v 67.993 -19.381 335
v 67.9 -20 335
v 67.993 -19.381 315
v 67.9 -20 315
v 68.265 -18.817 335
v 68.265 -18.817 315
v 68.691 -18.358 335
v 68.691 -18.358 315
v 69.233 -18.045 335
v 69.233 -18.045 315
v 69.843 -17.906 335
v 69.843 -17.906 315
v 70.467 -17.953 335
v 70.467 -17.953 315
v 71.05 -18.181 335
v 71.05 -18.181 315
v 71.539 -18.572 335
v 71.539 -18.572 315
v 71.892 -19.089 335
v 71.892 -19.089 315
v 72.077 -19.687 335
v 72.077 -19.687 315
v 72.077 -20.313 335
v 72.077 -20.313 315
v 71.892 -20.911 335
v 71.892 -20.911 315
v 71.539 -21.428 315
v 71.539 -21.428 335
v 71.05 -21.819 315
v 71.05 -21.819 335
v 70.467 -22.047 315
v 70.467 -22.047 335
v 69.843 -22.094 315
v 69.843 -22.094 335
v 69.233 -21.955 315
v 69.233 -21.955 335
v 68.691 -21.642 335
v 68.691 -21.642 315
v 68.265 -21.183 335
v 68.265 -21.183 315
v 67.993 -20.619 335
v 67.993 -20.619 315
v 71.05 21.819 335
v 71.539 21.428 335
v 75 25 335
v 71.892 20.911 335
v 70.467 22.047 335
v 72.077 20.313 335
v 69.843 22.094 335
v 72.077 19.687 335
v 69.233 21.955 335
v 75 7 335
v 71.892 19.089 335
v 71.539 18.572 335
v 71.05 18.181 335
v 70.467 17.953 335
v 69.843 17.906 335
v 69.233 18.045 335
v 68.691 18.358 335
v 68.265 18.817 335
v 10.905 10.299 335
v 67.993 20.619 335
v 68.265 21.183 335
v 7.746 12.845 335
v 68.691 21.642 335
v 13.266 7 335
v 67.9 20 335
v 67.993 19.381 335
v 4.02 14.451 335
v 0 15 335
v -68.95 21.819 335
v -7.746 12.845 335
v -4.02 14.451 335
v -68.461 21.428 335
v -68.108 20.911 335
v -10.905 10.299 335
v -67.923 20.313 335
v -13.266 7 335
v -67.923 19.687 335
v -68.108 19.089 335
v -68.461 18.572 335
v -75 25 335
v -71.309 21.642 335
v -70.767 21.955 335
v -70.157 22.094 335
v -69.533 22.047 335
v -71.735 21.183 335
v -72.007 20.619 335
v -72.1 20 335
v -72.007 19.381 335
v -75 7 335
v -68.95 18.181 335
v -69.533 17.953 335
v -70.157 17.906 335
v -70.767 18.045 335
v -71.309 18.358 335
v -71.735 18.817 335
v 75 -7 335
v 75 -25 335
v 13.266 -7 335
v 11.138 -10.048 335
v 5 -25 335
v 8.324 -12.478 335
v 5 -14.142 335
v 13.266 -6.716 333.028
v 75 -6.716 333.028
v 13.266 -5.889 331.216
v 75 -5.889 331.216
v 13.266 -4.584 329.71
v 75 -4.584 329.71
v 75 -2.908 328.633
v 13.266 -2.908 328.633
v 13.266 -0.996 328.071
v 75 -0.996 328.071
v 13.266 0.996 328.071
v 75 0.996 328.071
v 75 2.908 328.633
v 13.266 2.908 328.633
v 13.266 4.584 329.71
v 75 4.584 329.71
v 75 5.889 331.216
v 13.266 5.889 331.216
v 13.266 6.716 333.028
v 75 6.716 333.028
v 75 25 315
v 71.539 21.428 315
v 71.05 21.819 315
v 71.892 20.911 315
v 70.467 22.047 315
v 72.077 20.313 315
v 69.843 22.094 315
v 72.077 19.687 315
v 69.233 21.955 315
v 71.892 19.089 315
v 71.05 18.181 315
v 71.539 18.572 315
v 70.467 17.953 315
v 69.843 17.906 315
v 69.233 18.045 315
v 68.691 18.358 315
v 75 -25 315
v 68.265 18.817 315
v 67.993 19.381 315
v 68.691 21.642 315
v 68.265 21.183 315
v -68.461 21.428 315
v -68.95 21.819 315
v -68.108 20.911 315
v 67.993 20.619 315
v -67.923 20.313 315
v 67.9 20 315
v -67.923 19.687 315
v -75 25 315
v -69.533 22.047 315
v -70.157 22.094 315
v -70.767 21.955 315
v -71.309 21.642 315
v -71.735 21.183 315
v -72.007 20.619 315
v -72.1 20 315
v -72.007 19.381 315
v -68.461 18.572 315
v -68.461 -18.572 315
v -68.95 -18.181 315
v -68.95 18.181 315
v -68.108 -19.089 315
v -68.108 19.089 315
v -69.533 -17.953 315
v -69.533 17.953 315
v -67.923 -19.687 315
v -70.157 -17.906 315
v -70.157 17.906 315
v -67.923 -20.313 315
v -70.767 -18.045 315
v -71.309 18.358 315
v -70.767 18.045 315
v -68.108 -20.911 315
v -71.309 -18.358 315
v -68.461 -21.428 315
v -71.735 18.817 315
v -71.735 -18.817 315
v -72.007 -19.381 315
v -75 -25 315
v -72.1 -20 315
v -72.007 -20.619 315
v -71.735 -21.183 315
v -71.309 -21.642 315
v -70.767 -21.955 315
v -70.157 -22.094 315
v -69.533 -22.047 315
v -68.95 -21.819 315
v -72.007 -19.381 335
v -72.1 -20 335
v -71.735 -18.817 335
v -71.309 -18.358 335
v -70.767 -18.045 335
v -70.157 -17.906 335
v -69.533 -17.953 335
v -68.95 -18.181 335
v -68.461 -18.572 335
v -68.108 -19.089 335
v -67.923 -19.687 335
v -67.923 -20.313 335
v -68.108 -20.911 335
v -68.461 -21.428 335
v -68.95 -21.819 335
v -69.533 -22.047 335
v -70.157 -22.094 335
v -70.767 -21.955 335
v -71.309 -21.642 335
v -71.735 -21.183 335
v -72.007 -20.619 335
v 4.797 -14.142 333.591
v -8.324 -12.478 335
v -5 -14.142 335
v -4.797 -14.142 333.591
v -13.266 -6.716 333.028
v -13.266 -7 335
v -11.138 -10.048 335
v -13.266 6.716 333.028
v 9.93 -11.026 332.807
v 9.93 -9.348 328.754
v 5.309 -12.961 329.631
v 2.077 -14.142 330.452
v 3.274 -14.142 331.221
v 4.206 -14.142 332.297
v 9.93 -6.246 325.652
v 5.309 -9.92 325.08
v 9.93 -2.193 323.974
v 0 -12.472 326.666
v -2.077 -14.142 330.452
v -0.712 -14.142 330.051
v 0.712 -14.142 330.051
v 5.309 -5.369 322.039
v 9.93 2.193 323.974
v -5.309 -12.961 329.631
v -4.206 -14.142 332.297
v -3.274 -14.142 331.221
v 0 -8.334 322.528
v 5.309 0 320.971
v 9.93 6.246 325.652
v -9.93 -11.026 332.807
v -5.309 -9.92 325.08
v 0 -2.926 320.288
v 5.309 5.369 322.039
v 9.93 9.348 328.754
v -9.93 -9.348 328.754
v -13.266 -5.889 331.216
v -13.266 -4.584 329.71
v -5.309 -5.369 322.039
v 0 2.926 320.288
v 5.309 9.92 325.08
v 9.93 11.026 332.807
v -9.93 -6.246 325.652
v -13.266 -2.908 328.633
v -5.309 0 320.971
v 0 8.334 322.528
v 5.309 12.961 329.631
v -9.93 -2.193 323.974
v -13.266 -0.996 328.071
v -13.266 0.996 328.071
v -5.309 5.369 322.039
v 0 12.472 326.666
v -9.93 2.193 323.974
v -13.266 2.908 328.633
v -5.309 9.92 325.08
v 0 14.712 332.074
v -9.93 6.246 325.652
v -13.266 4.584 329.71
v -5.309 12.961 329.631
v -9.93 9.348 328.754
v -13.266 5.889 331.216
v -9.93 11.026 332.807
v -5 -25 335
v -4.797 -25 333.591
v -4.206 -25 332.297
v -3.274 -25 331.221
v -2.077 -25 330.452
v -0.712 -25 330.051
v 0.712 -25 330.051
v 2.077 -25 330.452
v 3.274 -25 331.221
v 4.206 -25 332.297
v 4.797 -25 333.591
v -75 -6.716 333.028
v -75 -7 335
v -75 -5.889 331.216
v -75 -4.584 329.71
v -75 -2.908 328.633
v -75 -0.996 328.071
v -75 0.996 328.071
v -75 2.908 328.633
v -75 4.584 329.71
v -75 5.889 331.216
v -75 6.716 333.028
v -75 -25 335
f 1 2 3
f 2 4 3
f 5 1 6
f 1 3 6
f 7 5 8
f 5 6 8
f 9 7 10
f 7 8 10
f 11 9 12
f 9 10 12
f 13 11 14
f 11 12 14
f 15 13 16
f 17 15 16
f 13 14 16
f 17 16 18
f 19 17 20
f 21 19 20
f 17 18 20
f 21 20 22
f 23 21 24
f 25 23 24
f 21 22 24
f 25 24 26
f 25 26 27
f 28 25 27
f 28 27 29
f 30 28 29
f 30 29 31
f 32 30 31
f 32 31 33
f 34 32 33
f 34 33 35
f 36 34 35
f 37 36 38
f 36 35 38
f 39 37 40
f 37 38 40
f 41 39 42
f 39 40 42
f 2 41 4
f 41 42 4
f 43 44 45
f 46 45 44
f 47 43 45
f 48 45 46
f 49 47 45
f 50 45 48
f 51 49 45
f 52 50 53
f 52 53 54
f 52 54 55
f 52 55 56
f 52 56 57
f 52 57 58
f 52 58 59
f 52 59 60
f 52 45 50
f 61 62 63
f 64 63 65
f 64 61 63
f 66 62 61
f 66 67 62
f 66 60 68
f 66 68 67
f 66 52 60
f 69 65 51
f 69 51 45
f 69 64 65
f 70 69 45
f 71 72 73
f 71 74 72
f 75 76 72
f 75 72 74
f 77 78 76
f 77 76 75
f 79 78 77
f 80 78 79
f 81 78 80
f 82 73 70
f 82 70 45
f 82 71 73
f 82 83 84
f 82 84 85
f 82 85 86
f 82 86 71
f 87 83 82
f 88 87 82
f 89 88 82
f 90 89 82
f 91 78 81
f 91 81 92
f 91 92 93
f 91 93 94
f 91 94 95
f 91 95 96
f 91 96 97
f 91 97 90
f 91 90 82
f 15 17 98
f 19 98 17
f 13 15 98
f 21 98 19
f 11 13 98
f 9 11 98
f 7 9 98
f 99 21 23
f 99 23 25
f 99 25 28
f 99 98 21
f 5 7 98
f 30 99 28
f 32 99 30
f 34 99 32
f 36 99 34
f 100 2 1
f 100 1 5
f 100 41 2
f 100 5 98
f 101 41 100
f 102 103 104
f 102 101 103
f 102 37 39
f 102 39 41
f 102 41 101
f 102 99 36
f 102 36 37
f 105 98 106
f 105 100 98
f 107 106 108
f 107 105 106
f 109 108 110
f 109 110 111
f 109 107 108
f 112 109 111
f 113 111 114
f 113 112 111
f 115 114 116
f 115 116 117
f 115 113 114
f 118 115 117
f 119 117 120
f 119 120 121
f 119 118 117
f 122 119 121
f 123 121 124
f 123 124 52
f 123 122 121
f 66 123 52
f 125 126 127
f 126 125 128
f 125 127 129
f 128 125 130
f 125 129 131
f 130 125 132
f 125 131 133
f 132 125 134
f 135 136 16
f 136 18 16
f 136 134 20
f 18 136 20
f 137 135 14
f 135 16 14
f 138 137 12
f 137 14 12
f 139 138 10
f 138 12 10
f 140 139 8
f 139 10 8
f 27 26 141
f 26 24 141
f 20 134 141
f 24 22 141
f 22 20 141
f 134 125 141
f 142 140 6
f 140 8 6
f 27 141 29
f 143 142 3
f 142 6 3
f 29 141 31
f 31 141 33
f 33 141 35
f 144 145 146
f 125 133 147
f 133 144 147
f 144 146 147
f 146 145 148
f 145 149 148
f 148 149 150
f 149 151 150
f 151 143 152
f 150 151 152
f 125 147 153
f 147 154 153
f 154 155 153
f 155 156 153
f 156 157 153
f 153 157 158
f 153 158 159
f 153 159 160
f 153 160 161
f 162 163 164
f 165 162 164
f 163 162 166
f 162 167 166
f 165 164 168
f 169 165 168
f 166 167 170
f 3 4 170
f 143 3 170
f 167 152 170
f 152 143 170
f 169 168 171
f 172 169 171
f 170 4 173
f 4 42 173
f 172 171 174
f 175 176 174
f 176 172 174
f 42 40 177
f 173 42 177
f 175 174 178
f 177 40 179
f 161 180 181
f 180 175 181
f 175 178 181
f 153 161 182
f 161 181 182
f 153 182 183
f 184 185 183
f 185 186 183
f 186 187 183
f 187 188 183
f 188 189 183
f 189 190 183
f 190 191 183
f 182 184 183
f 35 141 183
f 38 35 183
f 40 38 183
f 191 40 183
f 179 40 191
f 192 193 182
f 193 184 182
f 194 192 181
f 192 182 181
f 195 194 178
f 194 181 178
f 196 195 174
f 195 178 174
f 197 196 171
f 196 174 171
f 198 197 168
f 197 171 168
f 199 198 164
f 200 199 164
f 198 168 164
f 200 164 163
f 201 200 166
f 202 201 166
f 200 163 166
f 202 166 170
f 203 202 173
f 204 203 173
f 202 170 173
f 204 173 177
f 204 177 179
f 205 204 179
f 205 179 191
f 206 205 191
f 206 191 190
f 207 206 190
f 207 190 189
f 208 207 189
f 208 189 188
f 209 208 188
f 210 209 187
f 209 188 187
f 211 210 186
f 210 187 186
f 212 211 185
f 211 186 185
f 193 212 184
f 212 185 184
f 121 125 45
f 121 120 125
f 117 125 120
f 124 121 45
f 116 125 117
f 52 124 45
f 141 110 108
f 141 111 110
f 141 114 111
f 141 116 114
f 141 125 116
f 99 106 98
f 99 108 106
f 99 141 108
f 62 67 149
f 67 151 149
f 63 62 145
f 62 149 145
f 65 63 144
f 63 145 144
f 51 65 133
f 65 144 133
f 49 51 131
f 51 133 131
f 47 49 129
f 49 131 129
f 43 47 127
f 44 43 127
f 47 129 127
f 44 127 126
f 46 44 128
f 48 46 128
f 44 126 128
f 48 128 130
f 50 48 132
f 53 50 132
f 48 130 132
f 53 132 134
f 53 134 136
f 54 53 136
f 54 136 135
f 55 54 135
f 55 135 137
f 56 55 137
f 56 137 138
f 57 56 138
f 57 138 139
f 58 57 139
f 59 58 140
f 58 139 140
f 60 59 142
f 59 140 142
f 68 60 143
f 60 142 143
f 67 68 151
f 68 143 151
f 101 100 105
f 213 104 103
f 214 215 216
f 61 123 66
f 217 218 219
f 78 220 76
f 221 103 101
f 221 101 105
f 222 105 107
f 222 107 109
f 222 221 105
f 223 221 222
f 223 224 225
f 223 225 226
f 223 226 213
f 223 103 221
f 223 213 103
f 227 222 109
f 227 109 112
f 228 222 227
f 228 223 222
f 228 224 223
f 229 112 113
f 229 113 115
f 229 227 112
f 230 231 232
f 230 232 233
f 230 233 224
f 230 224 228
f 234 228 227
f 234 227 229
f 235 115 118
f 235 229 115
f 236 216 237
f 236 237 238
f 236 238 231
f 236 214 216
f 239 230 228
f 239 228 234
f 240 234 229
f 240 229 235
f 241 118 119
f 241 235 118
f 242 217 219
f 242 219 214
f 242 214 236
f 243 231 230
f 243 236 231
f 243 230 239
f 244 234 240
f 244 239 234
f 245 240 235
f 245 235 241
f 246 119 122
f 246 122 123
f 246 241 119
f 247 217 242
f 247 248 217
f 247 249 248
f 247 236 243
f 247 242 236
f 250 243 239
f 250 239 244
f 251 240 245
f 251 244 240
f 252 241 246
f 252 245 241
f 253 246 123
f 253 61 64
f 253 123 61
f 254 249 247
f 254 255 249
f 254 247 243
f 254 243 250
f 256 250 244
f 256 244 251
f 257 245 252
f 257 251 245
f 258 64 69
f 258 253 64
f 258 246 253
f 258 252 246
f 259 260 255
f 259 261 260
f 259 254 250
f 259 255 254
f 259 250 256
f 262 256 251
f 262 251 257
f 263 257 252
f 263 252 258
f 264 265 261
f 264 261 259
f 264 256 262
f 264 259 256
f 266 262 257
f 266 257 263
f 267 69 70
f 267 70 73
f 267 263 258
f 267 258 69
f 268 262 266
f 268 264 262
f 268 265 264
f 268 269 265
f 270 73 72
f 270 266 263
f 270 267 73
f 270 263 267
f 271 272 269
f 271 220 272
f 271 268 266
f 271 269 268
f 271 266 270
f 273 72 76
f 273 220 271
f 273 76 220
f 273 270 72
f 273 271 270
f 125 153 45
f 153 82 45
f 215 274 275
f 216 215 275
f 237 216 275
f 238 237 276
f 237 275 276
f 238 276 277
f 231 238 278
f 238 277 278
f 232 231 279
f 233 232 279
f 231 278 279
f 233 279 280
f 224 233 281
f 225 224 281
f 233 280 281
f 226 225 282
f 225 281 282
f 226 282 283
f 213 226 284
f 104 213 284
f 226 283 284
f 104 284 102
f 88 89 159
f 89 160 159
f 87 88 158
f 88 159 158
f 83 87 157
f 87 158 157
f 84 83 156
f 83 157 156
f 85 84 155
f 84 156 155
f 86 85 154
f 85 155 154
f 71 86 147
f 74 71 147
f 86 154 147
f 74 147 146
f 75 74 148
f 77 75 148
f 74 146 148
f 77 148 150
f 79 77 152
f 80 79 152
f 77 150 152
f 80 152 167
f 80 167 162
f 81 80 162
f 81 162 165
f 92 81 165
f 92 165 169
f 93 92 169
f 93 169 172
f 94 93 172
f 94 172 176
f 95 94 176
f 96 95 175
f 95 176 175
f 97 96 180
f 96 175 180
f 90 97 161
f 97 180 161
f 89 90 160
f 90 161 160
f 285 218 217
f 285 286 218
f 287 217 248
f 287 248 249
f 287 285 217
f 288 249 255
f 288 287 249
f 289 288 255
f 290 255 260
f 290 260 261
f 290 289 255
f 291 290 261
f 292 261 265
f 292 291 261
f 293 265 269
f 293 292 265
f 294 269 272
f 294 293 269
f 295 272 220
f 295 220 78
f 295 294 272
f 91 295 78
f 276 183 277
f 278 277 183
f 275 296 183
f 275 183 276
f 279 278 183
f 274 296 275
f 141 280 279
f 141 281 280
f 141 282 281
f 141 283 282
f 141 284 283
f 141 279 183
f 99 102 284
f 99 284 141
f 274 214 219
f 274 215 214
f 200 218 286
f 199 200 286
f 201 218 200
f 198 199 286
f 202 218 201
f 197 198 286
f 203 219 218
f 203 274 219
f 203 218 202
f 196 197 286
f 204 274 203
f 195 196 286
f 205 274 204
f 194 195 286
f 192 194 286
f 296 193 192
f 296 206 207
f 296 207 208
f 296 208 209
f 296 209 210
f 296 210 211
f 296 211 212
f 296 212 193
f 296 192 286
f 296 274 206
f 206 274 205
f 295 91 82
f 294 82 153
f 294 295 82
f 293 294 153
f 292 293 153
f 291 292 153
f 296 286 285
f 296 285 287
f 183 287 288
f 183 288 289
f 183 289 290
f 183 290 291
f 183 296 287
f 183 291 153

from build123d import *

# Parameters (mm, degrees)
F1_DEPTH  = 25
F5_D      = 4.2
F5_DEPTH  = 20
F5_TIP    = 1.2618073
F10_DEPTH = 50.001


with BuildPart() as f1:
    # F0 (on Front) → F1 (new body, symmetric)
    with BuildSketch(Plane.XZ):
        with BuildLine():
            ThreePointArc((0, 315), (37.7725508345, 312.7270925319), (75, 305.9411708156))
            Line((75, 305.9411708156), (75, 335))
            Line((75, 335), (0, 335))
            Line((0, 335), (0, 315))
        make_face()
        with BuildLine():
            ThreePointArc((-75, 305.9411708156), (-37.7725508345, 312.7270925319), (0, 315))
            Line((0, 315), (0, 335))
            Line((0, 335), (-75, 335))
            Line((-75, 335), (-75, 305.9411708156))
        make_face()
    extrude(amount=F1_DEPTH, both=True)

    # F2 (on face) → F3 (revolve, cut)
    with BuildSketch(Plane.XY.offset(335)):
        with BuildLine():
            Line((-13.2664991614, 7), (-75, 7))
            Line((-75, 7), (-75, 0))
            Line((-75, 0), (-15, 0))
            ThreePointArc((-15, 0), (-14.5601766373, 3.6057254872), (-13.2664991614, 7))
        make_face()
        with BuildLine():
            ThreePointArc((13.2664991614, 7), (0, 15), (-13.2664991614, 7))
            ThreePointArc((-13.2664991614, 7), (-14.5601766373, 3.6057254872), (-15, 0))
            Line((-15, 0), (-13.2664991614, 0))
            Line((-13.2664991614, 0), (13.2664991614, 0))
            Line((13.2664991614, 0), (15, 0))
            ThreePointArc((15, 0), (14.5601766373, 3.6057254872), (13.2664991614, 7))
        make_face()
        with BuildLine():
            Line((75, 7), (13.2664991614, 7))
            ThreePointArc((13.2664991614, 7), (14.5601766373, 3.6057254872), (15, 0))
            Line((15, 0), (75, 0))
            Line((75, 0), (75, 7))
        make_face()
    revolve(axis=Axis((-44.1332495807, 0, 335), (1, 0, 0)), mode=Mode.SUBTRACT)

    # F5
    with Locations(Plane.XY.offset(335)):
        with Locations((-70, 20), (-70, -20), (70, 20), (70, -20)):
            Hole(F5_D / 2, depth=F5_DEPTH)
            with Locations((0, 0, -(F5_DEPTH + F5_TIP / 2))):  # 118° drill point
                Cone(0, F5_D / 2, F5_TIP, mode=Mode.SUBTRACT)

    # F6 (on face) → F7 (revolve, cut)
    with BuildSketch(Plane.XY.offset(335)):
        with BuildLine():
            Line((0, 0), (-5, 0))
            Line((-5, 0), (-5, -14.1421356237))
            ThreePointArc((-5, -14.1421356237), (-2.5365296809, -14.7839783948), (0, -15))
            Line((0, -15), (0, 0))
        make_face()
        with BuildLine():
            ThreePointArc((0, -15), (-2.5365296809, -14.7839783948), (-5, -14.1421356237))
            Line((-5, -14.1421356237), (-5, -25))
            Line((-5, -25), (0, -25))
            Line((0, -25), (0, -15))
        make_face()
    revolve(axis=Axis((0, -12.5, 335), (0, -1, 0)), mode=Mode.SUBTRACT)

    # F9 (on face) → F10 (cut, through all)
    with BuildSketch(Plane.XZ.offset(25)):
        with BuildLine():
            ThreePointArc((0, 315), (37.7725508345, 312.7270925319), (75, 305.9411708156))
            Line((75, 305.9411708156), (75, 315))
            Line((75, 315), (0, 315))
        make_face()
        with BuildLine():
            Line((-75, 315), (-75, 305.9411708156))
            ThreePointArc((-75, 305.9411708156), (-37.7725508345, 312.7270925319), (0, 315))
            Line((0, 315), (-75, 315))
        make_face()
    extrude(amount=-F10_DEPTH, mode=Mode.SUBTRACT)


solid = f1.part
